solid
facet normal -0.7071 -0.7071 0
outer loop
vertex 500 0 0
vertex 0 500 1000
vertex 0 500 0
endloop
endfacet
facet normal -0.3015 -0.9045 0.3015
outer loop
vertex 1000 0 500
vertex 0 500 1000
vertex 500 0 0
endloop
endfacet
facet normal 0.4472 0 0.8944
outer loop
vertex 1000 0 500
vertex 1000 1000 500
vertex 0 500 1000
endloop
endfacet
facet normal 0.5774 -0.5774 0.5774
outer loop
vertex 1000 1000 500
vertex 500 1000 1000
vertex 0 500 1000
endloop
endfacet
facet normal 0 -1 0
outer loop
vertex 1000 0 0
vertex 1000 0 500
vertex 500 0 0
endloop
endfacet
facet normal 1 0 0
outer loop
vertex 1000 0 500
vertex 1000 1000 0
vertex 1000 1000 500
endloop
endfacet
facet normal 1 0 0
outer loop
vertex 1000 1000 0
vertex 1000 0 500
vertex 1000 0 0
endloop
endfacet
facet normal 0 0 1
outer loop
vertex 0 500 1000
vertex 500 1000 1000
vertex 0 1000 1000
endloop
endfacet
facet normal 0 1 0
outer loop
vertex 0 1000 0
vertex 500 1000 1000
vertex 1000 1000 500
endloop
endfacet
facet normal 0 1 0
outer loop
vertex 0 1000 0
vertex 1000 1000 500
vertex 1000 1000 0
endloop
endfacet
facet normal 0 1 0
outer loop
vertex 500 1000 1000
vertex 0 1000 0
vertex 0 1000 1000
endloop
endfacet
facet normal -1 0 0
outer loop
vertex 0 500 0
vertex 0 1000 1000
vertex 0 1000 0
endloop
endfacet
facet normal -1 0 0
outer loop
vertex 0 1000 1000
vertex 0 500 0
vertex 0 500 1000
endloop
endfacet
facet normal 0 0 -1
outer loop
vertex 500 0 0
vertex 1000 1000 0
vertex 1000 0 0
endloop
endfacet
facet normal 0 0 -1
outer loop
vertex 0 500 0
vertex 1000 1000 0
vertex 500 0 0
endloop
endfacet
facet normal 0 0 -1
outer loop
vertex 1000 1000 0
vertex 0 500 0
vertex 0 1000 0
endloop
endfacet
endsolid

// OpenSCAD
Vertices = 1000 *
   [[0.5, 0.0, 0.0],// v0
    [1.0, 0.5, 0.0],// v1    
    [0.5, 1.0, 0.0],// v2
    [0.0, 0.5, 0.0],// v3
    [0.5, 0.0, 1.0],// v4
    [1.0, 0.5, 1.0],// v5
    [0.5, 1.0, 1.0],// v6
    [0.0, 0.5, 1.0],// v7
    [0.0, 0.0, 0.5],// v8
    [1.0, 0.0, 0.5],// v9
    [1.0, 1.0, 0.5],// v10
    [0.0, 1.0, 0.5],// v11
    [0.0, 0.0, 0.0],// p0
    [1.0, 0.0, 0.0],// p1
    [1.0, 1.0, 0.0],// p2
    [0.0, 1.0, 0.0],// p3
    [0.0, 0.0, 1.0],// p4
    [1.0, 0.0, 1.0],// p5
    [1.0, 1.0, 1.0],// p6
    [0.0, 1.0, 1.0]];//p7

function v(x) = x;
function p(x) = x + 12;

C1 = [[p(0),v(0), v(3)],
      [p(0),v(8), v(0)],
      [p(0),v(3), v(8)],
      [v(0),v(8), v(3)]];
 
 C2 = [[p(0), v(8), v(9), p(1)],
       [p(0), v(3), v(8)],
       [p(1), v(9), v(1)],
       [p(0), p(1), v(1), v(3)],
       [v(8), v(3), v(1), v(9)]];

C5 = [[v(0), v(9), p(1)],
      [v(0), v(3), v(9)],
      [v(11), v(9), v(3)],
      [v(11), v(10), v(9)],
      [p(2), p(3), v(3), v(0), p(1)],
      [p(1), v(9), v(10), p(2)],
      [v(10), v(11), p(3), p(2)],
      [v(11), v(3), p(3)]];

C9 = [[v(0), v(8), v(7), v(6), v(10), v(1)],
      [p(0), v(8), v(0)],
      [p(2), v(1), v(10)],
      [p(7), v(6), v(7)],
      [p(0), p(3), p(7), v(7), v(8)],
      [p(3), p(2), v(10), v(6), p(7)],
      [v(0), v(1), p(2), p(3), p(0)]];

C11 = [[v(8), v(0), p(0)],
       [v(8), v(11), v(0)],
       [v(11), v(5), v(0)],
       [v(0), v(5), v(1)],
       [v(11), v(6), v(5)],
       [v(5), v(6), p(6)],
       [p(0), p(3), v(11), v(8)],
       [p(2), v(1), v(5), p(6)],
       [p(2), p(6), v(6), v(11), p(3)],
       [v(0), v(1), p(2), p(3), p(0)]];

C15 = [[v(3), v(7), v(0)],
       [v(0), v(7), v(9)],
       [v(7), v(10), v(9)],
       [v(7), v(6), v(10)],
       [v(0), v(9), p(1)],
       [p(1), v(9), v(10), p(2)],
       [p(7), v(6), v(7)],
       [p(2), v(10), v(6), p(7), p(3)],
       [p(3), p(7), v(7), v(3)],
       [p(1), p(2), p(3), v(3), v(0)]];

//polyhedron(Vertices, C1);
//polyhedron(Vertices, C2);
//polyhedron(Vertices, C5);
//polyhedron(Vertices, C9);
//polyhedron(Vertices, C11);
polyhedron(Vertices, C15);

//V0 = 0;
//V1 = 3 * V(C1);
//V2 = volume(C2);
//V3 = 2 * V1;
//V4 = 2 * V1;
//V5 = volume(C5);
//V6 = V1 + V2;
//V7 = 3 * V1;
//V8 = 0.5;
//V9 = volume(C9);
//V10 = 2 * V2;
//V11 = volume(C11);
//V12 = V5 + V1;
//V13 = 4 * V1;
//V15 = volume(C15);
